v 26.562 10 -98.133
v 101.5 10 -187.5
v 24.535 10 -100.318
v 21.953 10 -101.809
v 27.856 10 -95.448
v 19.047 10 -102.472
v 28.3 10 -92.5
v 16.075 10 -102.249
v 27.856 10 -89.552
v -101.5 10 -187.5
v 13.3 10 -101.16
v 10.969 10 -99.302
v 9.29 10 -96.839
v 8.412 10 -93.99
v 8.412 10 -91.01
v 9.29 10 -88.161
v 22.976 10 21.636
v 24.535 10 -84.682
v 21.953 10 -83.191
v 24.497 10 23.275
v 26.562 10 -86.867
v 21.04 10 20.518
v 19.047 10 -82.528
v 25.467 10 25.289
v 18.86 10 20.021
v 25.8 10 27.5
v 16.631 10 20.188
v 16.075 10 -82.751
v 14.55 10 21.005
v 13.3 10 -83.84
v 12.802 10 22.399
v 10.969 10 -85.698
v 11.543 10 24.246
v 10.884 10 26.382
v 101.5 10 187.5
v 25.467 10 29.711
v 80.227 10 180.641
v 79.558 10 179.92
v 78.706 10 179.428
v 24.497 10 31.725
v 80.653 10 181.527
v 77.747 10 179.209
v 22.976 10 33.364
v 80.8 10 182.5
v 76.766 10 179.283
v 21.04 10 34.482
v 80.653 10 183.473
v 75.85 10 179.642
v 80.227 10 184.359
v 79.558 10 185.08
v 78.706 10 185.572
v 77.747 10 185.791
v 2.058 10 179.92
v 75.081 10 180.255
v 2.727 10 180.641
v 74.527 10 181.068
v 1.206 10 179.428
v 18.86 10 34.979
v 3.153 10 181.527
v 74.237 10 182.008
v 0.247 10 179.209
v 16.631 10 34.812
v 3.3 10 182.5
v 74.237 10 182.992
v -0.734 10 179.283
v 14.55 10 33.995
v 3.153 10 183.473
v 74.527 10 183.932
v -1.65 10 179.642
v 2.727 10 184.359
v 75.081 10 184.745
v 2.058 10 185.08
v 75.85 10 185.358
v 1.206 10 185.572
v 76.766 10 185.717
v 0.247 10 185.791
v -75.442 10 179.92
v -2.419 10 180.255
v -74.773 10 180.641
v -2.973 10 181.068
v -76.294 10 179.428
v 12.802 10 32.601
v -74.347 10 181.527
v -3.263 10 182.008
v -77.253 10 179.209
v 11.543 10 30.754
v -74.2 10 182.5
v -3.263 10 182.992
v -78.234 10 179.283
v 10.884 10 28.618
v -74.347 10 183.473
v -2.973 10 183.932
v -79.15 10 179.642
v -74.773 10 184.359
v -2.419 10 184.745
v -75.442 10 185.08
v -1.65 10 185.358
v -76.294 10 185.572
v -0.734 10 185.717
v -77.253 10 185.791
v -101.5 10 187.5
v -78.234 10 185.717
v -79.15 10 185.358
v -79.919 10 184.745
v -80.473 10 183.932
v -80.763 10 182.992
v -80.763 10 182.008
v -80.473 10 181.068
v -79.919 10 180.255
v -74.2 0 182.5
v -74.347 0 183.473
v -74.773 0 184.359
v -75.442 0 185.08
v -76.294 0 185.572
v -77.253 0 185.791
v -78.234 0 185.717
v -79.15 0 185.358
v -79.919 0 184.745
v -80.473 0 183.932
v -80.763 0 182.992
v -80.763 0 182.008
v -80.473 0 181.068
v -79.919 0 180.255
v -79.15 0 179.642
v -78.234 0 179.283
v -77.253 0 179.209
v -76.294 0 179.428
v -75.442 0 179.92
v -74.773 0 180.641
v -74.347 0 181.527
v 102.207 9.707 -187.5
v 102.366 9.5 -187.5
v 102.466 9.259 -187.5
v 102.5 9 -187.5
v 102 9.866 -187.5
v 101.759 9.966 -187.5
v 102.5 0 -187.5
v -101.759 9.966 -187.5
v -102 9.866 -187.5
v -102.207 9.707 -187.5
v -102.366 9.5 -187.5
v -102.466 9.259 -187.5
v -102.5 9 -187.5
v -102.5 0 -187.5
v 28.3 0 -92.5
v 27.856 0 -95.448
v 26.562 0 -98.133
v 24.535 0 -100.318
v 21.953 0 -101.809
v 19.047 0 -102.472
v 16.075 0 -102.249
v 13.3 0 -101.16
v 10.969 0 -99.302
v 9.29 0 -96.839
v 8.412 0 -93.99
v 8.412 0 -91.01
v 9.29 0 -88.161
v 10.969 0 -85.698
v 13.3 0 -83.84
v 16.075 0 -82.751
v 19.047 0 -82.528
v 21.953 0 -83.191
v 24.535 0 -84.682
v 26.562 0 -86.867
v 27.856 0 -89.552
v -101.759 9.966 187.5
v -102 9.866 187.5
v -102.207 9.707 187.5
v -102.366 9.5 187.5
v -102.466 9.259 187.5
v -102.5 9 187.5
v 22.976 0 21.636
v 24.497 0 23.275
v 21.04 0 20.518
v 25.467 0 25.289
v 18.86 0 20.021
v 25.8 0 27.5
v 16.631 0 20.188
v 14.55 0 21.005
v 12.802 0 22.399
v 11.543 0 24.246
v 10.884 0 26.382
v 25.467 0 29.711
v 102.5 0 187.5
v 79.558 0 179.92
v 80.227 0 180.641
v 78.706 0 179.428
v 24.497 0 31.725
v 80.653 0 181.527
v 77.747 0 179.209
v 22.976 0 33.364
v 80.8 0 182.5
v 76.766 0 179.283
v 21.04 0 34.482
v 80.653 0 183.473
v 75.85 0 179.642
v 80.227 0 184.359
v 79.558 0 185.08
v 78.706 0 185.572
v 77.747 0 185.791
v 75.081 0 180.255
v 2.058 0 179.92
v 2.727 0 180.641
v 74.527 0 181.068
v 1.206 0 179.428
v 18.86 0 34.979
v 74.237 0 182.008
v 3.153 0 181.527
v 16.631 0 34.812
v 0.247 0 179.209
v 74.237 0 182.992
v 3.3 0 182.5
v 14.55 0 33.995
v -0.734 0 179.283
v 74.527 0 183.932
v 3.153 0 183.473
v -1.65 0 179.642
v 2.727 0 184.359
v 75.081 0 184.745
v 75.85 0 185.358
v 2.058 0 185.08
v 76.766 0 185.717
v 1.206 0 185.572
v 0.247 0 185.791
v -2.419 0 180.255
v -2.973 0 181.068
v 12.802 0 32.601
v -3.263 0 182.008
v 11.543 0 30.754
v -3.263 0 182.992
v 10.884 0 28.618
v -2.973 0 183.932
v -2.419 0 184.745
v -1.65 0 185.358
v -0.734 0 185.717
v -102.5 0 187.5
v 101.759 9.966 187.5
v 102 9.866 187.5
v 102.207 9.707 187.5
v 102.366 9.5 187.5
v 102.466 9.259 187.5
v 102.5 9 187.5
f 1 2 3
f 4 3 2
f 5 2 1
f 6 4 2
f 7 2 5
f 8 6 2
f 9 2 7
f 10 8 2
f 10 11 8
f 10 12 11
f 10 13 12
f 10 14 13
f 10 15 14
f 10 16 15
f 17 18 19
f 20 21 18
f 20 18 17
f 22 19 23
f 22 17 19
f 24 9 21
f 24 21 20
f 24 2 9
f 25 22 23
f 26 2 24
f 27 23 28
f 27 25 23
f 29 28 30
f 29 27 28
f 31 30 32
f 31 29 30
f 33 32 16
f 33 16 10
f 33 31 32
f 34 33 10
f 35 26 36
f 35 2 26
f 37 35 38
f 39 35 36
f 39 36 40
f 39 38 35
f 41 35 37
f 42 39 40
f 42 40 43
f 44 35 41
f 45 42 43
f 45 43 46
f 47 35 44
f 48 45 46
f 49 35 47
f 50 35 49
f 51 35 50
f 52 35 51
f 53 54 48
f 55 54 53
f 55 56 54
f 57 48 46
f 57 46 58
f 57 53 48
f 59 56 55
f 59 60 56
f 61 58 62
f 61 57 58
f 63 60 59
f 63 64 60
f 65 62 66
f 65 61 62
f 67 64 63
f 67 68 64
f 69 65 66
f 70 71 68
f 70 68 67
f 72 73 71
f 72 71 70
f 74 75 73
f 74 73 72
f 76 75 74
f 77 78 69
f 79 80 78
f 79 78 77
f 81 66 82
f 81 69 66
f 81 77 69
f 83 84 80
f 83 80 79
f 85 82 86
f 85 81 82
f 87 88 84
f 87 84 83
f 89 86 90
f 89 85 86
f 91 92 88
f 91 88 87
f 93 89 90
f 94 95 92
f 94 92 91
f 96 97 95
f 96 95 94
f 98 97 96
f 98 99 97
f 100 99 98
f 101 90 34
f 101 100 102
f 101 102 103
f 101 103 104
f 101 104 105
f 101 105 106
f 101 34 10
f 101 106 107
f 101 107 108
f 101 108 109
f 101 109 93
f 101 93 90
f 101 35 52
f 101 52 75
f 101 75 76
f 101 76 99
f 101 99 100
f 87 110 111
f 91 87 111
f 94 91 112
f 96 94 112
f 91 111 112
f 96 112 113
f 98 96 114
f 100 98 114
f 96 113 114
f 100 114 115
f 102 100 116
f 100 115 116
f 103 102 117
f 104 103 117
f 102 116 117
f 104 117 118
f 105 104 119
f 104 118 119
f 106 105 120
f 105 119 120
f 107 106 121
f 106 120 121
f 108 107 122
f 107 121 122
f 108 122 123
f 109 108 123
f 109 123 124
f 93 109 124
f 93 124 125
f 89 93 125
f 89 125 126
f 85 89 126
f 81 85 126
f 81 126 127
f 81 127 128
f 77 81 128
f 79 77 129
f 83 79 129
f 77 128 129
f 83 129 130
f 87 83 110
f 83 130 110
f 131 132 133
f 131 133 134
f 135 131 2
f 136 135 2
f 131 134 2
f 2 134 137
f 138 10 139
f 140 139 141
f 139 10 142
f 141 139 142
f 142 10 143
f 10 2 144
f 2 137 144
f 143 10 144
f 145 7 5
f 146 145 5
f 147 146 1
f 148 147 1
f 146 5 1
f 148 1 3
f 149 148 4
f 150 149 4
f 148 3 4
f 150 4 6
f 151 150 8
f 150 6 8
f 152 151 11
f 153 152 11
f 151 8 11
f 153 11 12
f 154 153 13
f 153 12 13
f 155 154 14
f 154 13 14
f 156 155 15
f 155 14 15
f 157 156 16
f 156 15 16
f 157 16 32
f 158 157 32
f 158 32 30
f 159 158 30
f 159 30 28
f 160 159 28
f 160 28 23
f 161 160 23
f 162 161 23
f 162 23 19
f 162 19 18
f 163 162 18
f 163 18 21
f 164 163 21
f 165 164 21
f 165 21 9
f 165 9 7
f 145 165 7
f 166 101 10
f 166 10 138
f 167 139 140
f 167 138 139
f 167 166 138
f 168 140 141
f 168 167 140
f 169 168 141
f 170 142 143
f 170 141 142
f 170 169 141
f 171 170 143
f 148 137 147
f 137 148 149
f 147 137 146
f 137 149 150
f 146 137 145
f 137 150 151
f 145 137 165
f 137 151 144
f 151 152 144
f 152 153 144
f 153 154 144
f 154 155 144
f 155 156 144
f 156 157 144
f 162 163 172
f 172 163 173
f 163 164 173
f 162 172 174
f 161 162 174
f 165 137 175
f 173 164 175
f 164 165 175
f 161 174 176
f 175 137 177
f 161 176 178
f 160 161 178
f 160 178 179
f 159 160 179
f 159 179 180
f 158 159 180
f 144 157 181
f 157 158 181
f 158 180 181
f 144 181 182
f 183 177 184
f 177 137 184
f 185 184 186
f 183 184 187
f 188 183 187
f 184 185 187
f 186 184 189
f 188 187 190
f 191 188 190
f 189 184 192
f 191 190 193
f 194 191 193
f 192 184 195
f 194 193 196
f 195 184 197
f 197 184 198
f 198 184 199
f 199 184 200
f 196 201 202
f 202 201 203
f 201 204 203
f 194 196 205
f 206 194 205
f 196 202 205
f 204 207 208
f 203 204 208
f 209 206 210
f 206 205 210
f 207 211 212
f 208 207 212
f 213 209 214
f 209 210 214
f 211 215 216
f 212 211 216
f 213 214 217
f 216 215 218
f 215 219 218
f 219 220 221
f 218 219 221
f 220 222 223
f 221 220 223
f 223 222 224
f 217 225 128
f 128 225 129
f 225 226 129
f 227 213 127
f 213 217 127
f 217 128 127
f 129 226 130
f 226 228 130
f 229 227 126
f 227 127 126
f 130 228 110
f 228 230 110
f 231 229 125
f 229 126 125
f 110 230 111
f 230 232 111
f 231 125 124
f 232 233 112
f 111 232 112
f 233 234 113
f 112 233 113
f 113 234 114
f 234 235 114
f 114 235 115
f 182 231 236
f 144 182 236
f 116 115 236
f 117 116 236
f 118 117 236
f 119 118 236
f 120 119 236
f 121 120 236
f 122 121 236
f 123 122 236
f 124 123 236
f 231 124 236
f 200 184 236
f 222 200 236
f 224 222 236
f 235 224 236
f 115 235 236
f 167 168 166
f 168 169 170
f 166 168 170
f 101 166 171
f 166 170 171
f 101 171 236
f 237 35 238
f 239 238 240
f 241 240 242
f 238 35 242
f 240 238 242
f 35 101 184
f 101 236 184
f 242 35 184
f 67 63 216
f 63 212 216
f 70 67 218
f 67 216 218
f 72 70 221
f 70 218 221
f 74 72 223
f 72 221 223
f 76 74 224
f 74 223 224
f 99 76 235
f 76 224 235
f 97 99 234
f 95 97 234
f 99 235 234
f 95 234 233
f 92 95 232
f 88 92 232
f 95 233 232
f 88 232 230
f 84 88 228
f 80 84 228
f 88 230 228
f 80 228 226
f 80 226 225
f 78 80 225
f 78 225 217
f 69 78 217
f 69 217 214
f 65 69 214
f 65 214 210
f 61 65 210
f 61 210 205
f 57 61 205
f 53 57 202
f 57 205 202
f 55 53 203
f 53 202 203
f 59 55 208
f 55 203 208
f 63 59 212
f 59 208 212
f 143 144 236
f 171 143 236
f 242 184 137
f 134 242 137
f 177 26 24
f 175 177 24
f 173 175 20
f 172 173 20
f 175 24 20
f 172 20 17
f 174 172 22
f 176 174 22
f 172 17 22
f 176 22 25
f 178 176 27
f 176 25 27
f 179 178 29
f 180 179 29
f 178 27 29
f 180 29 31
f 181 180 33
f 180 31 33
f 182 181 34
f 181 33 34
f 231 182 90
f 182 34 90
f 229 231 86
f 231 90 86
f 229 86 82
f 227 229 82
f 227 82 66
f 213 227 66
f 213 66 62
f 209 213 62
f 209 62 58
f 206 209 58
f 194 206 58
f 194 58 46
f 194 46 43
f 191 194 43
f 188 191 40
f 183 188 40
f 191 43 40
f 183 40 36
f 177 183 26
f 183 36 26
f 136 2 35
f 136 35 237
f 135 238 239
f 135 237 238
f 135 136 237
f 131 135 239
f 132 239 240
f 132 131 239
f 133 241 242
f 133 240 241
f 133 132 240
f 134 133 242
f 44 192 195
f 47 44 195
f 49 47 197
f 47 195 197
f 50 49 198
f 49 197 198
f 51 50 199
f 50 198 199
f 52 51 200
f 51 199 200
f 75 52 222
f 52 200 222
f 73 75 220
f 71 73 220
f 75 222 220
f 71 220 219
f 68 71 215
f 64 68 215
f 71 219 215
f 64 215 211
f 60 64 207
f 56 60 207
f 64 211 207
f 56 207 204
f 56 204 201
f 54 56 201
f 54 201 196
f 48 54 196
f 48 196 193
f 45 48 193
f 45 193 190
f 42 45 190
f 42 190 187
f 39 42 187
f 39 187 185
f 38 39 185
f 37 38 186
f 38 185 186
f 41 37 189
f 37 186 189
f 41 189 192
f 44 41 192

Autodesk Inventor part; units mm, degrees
ref_plane "YZ Plane" through (0, 0, 0) normal (1, 0, 0) x (0, 1, 0)
ref_plane "XZ Plane" through (0, 0, 0) normal (0, 1, 0) x (-1, 0, 0)
ref_plane "XY Plane" through (0, 0, 0) normal (0, 0, 1) x (1, 0, 0)
sketch "Sketch1" plane through (0, 0, 0) normal (0, 1, 0) x (-1, 0, 0)
  line L0 (102.5, 187.5) -> (-102.5, 187.5)
  line L1 (-102.5, 187.5) -> (-102.5, -187.5)
  line L2 (-102.5, -187.5) -> (102.5, -187.5)
  line L3 (102.5, -187.5) -> (102.5, 187.5)
  line L4 (102.5, 187.5) -> (-102.5, -187.5) construction
  line L5 (-102.5, 187.5) -> (102.5, -187.5) construction
  point P0 (0, 0)
  dimension "d0" = 205
  dimension "d1" = 375
extrude "Extrusion1" add sketch "Sketch1" along normal blind 10
fillet "Fillet1" radius 1 2 edges at (102.5, 10, 0) (-102.5, 10, 0)
sketch "Sketch3" plane through (0, 0, 0) normal (0, -1, 0) x (1, 0, 0)
  line L0 (102.5, -187.5) -> (-102.5, -187.5) projected
  line L1 (102.5, 187.5) -> (102.5, -187.5) projected
  line L2 (-102.5, 187.5) -> (102.5, 187.5) projected
  line L3 (-102.5, -187.5) -> (-102.5, 187.5) projected
  line L4 (102.5, 187.5) -> (102.5, -187.5) projected
  line L5 (-102.5, -187.5) -> (-102.5, 187.5) projected
  line L6 (102.5, 187.5) -> (-102.5, 187.5)
  line L7 (-102.5, 187.5) -> (-102.5, 177.5)
  line L8 (-102.5, 177.5) -> (102.5, 177.5)
  line L9 (102.5, 177.5) -> (102.5, 187.5)
  line L10 (102.5, 182.5) -> (77.5, 182.5)
  line L11 (77.5, 182.5) -> (0, 182.5)
  line L12 (0, 182.5) -> (-77.5, 182.5)
  circle A0 centre (77.5, 182.5) radius 3.3
  circle A1 centre (0, 182.5) radius 3.3
  circle A2 centre (-77.5, 182.5) radius 3.3
  point P0 (0, 0)
  dimension "d5" = 10
  dimension "d21" = 25
  dimension "d22" = 77.5
  dimension "d23" = 6.6
  dimension "d24" = 6.6
  dimension "d25" = 6.6
extrude "Extrusion2" cut sketch "Sketch3" against normal up to surface (10 mm away) contours A2 | A1 L12 L11 | L11 L12 A1 | A0 L11 L10 | L10 L11 A0
sketch "Sketch4" plane through (0, 10, 0) normal (0, 1, 0) x (1, 0, 0)
  line L0 (-101.5, -187.5) -> (-102.5, -187.5) projected
  line L1 (-102.5, -187.5) -> (-18.3, -187.5)
  line L2 (-101.5, -187.5) -> (101.5, -187.5) projected
  line L3 (-18.3, -187.5) -> (-18.3, -27.5)
  circle A0 centre (-18.3, -27.5) radius 7.5
  line L4 (-18.3, -27.5) -> (-18.3, 92.5)
  circle A1 centre (-18.3, 92.5) radius 10
  circle A2 centre (77.5, -182.5) radius 3.3 projected
  circle A3 centre (-77.5, -182.5) radius 3.3 projected
  circle A4 centre (0, -182.5) radius 3.3 projected
  line L5 (-101.5, -187.5) -> (-101.5, 187.5) projected
  line L6 (-101.5, -187.5) -> (101.5, -187.5) projected
  line L7 (101.5, 187.5) -> (101.5, -187.5) projected
  line L8 (101.5, 187.5) -> (-101.5, 187.5) projected
  line L9 (101.5, 187.5) -> (-101.5, 187.5) projected
  line L10 (0, 187.5) -> (0, -187.5)
  circle A5 centre (18.3, -27.5) radius 7.5
  circle A6 centre (18.3, 92.5) radius 10
  point P0 (0, 0)
  dimension "d11" = 84.2
  dimension "d12" = 160
  dimension "d13" = 15
  dimension "d16" = 120
  dimension "d17" = 20
extrude "Extrusion3" cut sketch "Sketch4" against normal up to surface (10 mm away) contours A5 | A6
properties part number "płyta_boczna_obudowy_odbita"
